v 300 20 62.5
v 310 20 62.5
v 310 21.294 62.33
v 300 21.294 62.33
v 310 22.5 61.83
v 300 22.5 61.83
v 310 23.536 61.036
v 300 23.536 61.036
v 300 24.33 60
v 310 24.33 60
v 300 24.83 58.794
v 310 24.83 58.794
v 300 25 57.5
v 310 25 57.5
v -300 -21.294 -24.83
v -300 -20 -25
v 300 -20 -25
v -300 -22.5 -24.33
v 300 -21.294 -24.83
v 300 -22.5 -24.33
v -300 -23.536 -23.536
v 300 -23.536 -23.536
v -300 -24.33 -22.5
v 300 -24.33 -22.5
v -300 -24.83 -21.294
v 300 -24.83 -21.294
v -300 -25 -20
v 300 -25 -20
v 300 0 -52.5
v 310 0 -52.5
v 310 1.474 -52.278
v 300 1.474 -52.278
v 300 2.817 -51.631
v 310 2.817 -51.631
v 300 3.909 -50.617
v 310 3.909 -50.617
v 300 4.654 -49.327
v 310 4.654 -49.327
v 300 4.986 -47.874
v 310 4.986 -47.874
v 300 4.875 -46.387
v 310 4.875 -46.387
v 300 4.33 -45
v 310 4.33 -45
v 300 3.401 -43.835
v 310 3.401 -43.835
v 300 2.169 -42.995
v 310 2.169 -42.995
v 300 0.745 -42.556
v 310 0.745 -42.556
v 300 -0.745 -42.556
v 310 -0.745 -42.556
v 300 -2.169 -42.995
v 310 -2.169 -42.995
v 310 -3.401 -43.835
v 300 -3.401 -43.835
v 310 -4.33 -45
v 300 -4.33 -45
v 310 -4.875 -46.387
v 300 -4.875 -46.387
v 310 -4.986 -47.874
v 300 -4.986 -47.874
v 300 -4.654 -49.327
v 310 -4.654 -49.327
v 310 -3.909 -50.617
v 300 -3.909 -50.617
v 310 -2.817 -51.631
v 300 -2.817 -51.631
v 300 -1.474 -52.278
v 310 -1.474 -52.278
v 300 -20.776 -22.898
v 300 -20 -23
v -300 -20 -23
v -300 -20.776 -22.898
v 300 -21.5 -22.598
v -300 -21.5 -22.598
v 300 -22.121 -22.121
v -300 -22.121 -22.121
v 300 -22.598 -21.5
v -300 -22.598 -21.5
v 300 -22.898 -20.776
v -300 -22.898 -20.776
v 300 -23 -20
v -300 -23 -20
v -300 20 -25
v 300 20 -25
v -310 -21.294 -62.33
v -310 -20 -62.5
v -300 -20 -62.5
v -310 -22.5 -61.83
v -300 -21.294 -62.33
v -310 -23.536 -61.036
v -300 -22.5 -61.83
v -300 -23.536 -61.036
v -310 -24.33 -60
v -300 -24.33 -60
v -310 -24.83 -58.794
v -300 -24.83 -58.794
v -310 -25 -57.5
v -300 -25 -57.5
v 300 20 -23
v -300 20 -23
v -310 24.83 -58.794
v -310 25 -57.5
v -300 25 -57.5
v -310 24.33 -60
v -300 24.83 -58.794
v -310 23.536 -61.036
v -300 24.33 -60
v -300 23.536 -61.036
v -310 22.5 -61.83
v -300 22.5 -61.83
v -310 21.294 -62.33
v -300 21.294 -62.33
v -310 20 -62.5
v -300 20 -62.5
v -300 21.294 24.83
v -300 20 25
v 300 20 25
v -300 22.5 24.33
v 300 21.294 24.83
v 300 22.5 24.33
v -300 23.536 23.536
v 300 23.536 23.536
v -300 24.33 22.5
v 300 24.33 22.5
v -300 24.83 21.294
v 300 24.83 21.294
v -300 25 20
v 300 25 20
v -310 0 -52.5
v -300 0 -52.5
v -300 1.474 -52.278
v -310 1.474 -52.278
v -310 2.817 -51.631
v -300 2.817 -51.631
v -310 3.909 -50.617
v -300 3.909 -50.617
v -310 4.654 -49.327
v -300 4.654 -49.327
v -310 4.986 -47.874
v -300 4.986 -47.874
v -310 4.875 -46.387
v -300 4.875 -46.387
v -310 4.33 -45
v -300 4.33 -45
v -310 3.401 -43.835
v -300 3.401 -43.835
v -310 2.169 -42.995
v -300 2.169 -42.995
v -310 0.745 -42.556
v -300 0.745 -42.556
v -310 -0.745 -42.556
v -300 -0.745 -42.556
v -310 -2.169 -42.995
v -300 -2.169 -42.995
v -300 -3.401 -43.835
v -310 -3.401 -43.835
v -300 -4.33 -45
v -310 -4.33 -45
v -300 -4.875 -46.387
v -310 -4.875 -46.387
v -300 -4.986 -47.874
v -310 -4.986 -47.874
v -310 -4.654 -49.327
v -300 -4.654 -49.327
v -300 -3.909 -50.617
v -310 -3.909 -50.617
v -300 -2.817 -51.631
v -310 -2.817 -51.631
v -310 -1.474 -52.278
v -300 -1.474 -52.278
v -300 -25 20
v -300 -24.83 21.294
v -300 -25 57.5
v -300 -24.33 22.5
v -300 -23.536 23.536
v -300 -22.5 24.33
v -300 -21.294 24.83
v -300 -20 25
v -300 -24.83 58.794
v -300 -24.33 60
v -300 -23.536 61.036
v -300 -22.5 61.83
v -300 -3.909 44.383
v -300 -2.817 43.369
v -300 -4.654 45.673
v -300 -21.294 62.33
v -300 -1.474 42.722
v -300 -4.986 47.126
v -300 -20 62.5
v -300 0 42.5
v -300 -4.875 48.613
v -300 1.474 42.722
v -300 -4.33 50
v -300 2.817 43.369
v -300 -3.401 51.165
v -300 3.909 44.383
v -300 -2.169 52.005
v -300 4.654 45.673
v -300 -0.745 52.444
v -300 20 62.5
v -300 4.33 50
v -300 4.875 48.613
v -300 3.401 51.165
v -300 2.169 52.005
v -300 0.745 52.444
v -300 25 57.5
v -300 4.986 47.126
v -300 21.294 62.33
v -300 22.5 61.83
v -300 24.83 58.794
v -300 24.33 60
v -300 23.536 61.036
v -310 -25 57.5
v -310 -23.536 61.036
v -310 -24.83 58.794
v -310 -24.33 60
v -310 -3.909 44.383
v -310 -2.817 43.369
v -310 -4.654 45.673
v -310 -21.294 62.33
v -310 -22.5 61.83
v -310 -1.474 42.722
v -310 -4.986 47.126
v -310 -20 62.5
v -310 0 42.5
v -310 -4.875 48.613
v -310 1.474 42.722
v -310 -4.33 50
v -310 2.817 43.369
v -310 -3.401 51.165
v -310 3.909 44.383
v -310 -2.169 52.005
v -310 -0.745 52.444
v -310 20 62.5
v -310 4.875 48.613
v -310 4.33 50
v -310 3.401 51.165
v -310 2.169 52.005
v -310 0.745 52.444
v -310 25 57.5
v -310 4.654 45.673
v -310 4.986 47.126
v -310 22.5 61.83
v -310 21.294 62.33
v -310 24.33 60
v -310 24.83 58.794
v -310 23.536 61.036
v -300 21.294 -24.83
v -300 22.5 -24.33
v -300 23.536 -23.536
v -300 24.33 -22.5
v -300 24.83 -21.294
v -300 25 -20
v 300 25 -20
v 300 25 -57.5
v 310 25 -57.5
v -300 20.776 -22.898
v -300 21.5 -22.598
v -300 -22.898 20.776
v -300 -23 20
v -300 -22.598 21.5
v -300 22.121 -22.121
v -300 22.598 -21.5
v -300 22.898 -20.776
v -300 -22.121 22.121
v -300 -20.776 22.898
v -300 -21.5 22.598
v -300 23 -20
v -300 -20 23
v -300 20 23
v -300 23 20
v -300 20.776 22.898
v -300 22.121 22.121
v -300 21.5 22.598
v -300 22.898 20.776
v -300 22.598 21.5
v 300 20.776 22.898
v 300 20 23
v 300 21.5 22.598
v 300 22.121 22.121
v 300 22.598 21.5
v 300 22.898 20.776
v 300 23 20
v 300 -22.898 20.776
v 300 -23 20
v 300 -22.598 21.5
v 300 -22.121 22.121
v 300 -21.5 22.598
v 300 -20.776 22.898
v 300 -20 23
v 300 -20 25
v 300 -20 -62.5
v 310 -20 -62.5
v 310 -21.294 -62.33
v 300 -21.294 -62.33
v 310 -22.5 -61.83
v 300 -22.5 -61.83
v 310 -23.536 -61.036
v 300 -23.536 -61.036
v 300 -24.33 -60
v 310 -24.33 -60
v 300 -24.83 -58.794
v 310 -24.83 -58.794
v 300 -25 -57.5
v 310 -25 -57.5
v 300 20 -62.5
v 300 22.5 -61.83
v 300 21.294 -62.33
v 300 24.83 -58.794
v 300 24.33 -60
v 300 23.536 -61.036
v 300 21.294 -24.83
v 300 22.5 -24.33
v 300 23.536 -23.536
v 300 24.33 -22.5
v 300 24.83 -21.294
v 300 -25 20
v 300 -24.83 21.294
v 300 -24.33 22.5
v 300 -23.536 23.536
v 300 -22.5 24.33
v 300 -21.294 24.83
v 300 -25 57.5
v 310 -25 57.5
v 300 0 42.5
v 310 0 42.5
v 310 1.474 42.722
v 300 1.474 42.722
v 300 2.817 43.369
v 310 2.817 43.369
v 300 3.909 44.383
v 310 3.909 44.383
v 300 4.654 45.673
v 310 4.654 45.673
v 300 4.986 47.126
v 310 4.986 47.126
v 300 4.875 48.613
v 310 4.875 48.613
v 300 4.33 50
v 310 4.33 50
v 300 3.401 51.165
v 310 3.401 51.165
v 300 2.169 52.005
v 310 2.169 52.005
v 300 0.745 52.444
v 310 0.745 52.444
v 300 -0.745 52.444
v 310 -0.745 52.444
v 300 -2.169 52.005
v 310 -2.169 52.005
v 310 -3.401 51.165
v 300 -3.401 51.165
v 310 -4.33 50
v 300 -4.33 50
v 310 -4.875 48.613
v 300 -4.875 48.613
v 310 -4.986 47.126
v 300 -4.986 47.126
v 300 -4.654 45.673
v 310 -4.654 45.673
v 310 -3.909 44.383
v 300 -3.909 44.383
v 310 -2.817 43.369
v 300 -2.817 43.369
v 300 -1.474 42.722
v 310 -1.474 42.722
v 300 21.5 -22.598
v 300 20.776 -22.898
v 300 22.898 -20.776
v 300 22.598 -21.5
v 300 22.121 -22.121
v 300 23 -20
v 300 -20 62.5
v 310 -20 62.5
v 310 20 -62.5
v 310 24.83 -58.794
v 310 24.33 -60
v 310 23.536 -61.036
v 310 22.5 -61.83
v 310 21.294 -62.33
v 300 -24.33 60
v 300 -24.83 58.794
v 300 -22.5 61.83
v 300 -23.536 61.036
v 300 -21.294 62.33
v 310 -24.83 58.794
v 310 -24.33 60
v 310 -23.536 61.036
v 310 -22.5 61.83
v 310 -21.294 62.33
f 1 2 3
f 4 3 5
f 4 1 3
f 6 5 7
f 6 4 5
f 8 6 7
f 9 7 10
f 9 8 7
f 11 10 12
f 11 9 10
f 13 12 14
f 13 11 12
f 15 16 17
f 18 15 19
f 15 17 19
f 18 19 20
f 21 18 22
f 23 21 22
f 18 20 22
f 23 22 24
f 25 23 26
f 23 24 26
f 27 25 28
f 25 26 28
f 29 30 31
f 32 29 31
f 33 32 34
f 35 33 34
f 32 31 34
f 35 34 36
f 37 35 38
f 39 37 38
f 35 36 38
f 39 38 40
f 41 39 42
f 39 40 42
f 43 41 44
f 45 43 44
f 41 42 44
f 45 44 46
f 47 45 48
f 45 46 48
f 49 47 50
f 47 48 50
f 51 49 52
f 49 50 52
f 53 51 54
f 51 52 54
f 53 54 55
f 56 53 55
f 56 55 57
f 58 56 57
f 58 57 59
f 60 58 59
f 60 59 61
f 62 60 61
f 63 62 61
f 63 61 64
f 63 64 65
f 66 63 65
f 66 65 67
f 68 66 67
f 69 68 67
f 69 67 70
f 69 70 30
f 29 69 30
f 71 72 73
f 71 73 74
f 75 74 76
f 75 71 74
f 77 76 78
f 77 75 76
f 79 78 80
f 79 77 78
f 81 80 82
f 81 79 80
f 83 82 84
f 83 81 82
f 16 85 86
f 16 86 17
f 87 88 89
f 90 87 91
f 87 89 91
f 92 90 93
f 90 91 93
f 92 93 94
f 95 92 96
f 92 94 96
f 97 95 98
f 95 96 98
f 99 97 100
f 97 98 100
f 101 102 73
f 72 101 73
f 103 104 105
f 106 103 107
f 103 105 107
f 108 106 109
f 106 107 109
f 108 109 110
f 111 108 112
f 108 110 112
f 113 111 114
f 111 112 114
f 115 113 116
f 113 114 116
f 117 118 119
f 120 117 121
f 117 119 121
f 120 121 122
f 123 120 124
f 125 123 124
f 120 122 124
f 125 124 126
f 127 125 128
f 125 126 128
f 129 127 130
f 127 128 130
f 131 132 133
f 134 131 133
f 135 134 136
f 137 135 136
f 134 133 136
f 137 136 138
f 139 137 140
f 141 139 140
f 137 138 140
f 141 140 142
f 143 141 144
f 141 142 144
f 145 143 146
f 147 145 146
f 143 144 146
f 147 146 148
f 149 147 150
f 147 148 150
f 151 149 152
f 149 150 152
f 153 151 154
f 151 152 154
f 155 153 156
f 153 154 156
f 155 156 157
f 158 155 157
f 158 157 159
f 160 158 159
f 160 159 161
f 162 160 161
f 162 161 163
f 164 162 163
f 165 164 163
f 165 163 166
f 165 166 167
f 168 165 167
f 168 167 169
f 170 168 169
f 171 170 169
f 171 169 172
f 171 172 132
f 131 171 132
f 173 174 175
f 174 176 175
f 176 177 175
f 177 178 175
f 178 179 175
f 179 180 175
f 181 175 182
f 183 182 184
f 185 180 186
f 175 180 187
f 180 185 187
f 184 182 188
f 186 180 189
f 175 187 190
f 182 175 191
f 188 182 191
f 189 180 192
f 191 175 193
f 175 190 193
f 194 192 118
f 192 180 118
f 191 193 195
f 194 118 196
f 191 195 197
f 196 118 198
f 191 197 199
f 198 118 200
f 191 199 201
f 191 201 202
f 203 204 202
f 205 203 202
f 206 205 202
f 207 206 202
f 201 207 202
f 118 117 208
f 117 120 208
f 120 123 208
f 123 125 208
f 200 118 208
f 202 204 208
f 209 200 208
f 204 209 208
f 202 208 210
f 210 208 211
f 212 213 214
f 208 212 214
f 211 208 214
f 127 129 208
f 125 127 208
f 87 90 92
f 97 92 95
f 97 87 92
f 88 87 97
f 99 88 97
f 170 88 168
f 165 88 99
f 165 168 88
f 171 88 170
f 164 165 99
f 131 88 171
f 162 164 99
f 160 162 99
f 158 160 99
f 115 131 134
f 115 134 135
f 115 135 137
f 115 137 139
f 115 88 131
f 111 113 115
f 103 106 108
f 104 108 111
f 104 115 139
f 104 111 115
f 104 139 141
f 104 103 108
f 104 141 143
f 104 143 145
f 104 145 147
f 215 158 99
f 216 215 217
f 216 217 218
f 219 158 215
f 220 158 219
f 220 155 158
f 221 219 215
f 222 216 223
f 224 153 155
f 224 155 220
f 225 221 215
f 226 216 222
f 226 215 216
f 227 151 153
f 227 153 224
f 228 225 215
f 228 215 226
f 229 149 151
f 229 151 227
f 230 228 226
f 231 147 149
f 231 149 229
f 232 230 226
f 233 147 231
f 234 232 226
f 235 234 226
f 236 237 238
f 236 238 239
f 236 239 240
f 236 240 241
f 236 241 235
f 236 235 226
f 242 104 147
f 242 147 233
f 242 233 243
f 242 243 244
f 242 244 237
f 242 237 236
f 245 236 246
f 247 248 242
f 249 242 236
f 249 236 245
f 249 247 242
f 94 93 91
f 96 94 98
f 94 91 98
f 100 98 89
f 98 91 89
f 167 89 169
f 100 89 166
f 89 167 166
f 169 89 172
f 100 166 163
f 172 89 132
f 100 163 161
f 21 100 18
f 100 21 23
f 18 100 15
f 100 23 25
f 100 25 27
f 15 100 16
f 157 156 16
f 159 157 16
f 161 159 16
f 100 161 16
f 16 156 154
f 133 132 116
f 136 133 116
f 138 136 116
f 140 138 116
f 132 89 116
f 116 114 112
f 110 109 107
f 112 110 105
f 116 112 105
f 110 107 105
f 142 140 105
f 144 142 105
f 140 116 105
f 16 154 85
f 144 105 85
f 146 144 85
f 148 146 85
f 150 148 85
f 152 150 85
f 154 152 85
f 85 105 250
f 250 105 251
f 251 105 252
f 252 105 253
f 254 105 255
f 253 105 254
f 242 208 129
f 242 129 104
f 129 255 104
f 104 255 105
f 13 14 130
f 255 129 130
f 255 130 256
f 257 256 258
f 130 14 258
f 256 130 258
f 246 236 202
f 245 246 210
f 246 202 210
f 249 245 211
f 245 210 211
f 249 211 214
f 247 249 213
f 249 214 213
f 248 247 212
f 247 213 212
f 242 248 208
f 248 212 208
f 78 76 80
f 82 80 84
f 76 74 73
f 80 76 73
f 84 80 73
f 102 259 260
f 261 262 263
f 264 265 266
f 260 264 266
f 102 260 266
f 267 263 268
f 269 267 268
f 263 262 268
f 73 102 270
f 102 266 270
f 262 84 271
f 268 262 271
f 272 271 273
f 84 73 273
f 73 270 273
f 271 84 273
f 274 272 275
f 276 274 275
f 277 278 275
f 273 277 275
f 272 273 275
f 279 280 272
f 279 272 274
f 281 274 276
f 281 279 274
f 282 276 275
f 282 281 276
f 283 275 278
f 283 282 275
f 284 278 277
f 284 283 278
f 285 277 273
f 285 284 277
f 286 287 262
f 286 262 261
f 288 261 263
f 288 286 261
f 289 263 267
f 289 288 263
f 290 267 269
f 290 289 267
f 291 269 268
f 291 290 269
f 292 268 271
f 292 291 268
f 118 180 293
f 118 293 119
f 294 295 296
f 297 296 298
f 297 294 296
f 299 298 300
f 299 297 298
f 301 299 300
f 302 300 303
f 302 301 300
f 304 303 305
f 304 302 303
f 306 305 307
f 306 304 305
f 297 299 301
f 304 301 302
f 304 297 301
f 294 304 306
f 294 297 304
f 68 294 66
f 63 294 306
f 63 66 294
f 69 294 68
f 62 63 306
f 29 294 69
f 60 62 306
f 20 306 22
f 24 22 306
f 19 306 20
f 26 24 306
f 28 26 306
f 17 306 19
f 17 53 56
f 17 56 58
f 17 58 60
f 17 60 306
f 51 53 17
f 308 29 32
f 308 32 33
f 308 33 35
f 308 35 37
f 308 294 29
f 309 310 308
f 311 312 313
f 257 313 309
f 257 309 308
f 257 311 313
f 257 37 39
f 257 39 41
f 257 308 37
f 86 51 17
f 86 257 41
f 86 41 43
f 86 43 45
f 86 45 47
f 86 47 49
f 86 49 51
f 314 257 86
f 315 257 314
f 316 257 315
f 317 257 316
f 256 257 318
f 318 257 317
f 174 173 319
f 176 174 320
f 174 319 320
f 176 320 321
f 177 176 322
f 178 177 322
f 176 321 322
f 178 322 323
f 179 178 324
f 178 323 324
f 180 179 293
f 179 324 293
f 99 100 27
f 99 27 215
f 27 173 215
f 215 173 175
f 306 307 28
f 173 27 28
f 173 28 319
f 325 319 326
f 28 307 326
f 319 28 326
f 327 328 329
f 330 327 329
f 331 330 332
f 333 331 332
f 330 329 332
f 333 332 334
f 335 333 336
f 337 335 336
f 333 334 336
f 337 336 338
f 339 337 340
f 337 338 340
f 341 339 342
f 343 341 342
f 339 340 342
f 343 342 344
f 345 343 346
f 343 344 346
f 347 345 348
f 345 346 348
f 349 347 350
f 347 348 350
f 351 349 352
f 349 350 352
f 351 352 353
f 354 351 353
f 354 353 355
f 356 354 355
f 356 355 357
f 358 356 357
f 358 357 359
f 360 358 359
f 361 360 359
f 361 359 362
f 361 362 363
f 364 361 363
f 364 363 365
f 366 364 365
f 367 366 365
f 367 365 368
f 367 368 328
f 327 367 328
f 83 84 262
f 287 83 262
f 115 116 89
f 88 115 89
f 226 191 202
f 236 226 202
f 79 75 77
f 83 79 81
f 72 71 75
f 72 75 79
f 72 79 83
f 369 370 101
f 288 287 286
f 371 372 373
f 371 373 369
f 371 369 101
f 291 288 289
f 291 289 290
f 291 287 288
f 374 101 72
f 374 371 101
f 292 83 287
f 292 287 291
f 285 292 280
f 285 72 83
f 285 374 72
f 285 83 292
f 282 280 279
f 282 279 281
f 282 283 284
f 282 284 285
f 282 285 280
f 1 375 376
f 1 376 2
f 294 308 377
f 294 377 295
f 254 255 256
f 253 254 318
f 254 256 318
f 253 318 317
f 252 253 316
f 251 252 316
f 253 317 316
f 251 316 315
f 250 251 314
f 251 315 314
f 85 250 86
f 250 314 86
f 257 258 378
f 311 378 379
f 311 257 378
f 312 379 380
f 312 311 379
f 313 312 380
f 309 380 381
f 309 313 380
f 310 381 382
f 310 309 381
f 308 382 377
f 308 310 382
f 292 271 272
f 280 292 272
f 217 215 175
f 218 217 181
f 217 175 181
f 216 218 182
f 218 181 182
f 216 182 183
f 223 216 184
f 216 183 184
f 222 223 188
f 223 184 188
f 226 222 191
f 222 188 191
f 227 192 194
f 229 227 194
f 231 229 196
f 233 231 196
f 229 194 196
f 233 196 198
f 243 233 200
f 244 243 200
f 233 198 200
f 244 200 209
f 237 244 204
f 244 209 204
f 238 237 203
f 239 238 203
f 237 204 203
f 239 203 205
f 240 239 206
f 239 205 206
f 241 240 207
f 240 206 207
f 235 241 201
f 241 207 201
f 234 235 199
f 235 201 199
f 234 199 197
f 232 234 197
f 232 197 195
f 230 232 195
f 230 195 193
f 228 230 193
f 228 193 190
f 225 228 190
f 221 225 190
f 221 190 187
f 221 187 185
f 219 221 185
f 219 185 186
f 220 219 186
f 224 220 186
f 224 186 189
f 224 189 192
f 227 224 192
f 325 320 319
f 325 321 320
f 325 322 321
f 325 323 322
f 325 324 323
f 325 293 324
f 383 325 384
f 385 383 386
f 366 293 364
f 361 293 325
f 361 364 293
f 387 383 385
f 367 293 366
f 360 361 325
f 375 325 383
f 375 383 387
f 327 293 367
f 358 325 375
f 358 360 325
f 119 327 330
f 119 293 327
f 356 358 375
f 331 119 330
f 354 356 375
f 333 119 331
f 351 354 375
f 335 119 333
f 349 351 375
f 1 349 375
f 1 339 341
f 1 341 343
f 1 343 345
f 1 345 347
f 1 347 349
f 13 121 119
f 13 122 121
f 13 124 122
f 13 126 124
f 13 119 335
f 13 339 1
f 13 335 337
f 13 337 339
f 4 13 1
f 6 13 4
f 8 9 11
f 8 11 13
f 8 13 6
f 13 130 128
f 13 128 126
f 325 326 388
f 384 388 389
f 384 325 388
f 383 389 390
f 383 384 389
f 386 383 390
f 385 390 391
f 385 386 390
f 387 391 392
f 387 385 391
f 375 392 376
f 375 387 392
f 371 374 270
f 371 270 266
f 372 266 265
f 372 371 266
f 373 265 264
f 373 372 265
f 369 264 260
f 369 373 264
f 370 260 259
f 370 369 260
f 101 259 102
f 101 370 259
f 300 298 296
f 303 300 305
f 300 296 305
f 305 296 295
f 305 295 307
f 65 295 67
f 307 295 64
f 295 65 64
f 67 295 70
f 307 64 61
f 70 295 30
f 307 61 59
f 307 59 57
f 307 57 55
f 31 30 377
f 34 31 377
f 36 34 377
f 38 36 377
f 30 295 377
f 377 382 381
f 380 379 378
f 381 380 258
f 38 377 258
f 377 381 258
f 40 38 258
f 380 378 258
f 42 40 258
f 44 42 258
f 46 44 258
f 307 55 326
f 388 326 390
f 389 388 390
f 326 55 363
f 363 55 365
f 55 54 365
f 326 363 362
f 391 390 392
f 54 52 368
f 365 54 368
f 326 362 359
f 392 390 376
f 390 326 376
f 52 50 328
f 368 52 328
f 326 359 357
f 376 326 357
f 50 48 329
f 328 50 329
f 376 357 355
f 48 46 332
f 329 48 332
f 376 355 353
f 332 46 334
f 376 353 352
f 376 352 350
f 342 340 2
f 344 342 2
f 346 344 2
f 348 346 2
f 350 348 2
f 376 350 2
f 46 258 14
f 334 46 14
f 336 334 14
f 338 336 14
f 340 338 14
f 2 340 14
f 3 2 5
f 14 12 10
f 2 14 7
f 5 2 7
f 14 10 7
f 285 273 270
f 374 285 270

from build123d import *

# Parameters (mm, degrees)
BOSS_EXTRUDE1_DEPTH = 300
BOSS_EXTRUDE2_DEPTH = 10
SKETCH3_R           = 5
CUT_EXTRUDE1_DEPTH  = 624.643527987


with BuildPart() as part:
    # Sketch1 → Boss-Extrude1 (new, symmetric)
    with BuildSketch(Plane(origin=(0, 0, 0), x_dir=(0, 0, -1), z_dir=(1, 0, 0))):
        with BuildLine():
            Line((-20, 25), (20, 25))
            ThreePointArc((20, 25), (23.535533906, 23.535533906), (25, 20))
            Line((25, 20), (25, -20))
            ThreePointArc((25, -20), (23.535533906, -23.535533906), (20, -25))
            Line((20, -25), (-20, -25))
            ThreePointArc((-20, -25), (-23.535533906, -23.535533906), (-25, -20))
            Line((-25, -20), (-25, 20))
            ThreePointArc((-25, 20), (-23.535533906, 23.535533906), (-20, 25))
        make_face()
        with BuildLine():
            Line((-20, 23), (20, 23))
            ThreePointArc((20, 23), (22.121320344, 22.121320344), (23, 20))
            Line((23, 20), (23, -20))
            ThreePointArc((23, -20), (22.121320344, -22.121320344), (20, -23))
            Line((20, -23), (-20, -23))
            ThreePointArc((-20, -23), (-22.121320344, -22.121320344), (-23, -20))
            Line((-23, -20), (-23, 20))
            ThreePointArc((-23, 20), (-22.121320344, 22.121320344), (-20, 23))
        make_face(mode=Mode.SUBTRACT)
    extrude(amount=BOSS_EXTRUDE1_DEPTH, both=True)

    # Sketch2 → Boss-Extrude2 (add)
    with BuildSketch(Plane(origin=(300, 0, 0), x_dir=(0, 0, -1), z_dir=(1, 0, 0))):
        with BuildLine():
            Line((-57.5, 25), (57.5, 25))
            ThreePointArc((57.5, 25), (61.035533906, 23.535533906), (62.5, 20))
            Line((62.5, 20), (62.5, -20))
            ThreePointArc((62.5, -20), (61.035533906, -23.535533906), (57.5, -25))
            Line((57.5, -25), (-57.5, -25))
            ThreePointArc((-57.5, -25), (-61.035533906, -23.535533906), (-62.5, -20))
            Line((-62.5, -20), (-62.5, 20))
            ThreePointArc((-62.5, 20), (-61.035533906, 23.535533906), (-57.5, 25))
        make_face()
    boss_extrude2 = extrude(amount=BOSS_EXTRUDE2_DEPTH)

    # Mirror1: Boss-Extrude2 across plane
    add(boss_extrude2.mirror(Plane(origin=(0, 0, 0), x_dir=(0, 0, 1), z_dir=(1, 0, 0))))

    # Sketch3 → Cut-Extrude1 (cut, through all)
    with BuildSketch(Plane(origin=(310, 0, 0), x_dir=(0, 0, -1), z_dir=(1, 0, 0))):
        with Locations((-47.5, 0)):
            Circle(SKETCH3_R)
        with Locations((47.5, 0)):
            Circle(SKETCH3_R)
    extrude(amount=-CUT_EXTRUDE1_DEPTH, mode=Mode.SUBTRACT)


solid = part.part
